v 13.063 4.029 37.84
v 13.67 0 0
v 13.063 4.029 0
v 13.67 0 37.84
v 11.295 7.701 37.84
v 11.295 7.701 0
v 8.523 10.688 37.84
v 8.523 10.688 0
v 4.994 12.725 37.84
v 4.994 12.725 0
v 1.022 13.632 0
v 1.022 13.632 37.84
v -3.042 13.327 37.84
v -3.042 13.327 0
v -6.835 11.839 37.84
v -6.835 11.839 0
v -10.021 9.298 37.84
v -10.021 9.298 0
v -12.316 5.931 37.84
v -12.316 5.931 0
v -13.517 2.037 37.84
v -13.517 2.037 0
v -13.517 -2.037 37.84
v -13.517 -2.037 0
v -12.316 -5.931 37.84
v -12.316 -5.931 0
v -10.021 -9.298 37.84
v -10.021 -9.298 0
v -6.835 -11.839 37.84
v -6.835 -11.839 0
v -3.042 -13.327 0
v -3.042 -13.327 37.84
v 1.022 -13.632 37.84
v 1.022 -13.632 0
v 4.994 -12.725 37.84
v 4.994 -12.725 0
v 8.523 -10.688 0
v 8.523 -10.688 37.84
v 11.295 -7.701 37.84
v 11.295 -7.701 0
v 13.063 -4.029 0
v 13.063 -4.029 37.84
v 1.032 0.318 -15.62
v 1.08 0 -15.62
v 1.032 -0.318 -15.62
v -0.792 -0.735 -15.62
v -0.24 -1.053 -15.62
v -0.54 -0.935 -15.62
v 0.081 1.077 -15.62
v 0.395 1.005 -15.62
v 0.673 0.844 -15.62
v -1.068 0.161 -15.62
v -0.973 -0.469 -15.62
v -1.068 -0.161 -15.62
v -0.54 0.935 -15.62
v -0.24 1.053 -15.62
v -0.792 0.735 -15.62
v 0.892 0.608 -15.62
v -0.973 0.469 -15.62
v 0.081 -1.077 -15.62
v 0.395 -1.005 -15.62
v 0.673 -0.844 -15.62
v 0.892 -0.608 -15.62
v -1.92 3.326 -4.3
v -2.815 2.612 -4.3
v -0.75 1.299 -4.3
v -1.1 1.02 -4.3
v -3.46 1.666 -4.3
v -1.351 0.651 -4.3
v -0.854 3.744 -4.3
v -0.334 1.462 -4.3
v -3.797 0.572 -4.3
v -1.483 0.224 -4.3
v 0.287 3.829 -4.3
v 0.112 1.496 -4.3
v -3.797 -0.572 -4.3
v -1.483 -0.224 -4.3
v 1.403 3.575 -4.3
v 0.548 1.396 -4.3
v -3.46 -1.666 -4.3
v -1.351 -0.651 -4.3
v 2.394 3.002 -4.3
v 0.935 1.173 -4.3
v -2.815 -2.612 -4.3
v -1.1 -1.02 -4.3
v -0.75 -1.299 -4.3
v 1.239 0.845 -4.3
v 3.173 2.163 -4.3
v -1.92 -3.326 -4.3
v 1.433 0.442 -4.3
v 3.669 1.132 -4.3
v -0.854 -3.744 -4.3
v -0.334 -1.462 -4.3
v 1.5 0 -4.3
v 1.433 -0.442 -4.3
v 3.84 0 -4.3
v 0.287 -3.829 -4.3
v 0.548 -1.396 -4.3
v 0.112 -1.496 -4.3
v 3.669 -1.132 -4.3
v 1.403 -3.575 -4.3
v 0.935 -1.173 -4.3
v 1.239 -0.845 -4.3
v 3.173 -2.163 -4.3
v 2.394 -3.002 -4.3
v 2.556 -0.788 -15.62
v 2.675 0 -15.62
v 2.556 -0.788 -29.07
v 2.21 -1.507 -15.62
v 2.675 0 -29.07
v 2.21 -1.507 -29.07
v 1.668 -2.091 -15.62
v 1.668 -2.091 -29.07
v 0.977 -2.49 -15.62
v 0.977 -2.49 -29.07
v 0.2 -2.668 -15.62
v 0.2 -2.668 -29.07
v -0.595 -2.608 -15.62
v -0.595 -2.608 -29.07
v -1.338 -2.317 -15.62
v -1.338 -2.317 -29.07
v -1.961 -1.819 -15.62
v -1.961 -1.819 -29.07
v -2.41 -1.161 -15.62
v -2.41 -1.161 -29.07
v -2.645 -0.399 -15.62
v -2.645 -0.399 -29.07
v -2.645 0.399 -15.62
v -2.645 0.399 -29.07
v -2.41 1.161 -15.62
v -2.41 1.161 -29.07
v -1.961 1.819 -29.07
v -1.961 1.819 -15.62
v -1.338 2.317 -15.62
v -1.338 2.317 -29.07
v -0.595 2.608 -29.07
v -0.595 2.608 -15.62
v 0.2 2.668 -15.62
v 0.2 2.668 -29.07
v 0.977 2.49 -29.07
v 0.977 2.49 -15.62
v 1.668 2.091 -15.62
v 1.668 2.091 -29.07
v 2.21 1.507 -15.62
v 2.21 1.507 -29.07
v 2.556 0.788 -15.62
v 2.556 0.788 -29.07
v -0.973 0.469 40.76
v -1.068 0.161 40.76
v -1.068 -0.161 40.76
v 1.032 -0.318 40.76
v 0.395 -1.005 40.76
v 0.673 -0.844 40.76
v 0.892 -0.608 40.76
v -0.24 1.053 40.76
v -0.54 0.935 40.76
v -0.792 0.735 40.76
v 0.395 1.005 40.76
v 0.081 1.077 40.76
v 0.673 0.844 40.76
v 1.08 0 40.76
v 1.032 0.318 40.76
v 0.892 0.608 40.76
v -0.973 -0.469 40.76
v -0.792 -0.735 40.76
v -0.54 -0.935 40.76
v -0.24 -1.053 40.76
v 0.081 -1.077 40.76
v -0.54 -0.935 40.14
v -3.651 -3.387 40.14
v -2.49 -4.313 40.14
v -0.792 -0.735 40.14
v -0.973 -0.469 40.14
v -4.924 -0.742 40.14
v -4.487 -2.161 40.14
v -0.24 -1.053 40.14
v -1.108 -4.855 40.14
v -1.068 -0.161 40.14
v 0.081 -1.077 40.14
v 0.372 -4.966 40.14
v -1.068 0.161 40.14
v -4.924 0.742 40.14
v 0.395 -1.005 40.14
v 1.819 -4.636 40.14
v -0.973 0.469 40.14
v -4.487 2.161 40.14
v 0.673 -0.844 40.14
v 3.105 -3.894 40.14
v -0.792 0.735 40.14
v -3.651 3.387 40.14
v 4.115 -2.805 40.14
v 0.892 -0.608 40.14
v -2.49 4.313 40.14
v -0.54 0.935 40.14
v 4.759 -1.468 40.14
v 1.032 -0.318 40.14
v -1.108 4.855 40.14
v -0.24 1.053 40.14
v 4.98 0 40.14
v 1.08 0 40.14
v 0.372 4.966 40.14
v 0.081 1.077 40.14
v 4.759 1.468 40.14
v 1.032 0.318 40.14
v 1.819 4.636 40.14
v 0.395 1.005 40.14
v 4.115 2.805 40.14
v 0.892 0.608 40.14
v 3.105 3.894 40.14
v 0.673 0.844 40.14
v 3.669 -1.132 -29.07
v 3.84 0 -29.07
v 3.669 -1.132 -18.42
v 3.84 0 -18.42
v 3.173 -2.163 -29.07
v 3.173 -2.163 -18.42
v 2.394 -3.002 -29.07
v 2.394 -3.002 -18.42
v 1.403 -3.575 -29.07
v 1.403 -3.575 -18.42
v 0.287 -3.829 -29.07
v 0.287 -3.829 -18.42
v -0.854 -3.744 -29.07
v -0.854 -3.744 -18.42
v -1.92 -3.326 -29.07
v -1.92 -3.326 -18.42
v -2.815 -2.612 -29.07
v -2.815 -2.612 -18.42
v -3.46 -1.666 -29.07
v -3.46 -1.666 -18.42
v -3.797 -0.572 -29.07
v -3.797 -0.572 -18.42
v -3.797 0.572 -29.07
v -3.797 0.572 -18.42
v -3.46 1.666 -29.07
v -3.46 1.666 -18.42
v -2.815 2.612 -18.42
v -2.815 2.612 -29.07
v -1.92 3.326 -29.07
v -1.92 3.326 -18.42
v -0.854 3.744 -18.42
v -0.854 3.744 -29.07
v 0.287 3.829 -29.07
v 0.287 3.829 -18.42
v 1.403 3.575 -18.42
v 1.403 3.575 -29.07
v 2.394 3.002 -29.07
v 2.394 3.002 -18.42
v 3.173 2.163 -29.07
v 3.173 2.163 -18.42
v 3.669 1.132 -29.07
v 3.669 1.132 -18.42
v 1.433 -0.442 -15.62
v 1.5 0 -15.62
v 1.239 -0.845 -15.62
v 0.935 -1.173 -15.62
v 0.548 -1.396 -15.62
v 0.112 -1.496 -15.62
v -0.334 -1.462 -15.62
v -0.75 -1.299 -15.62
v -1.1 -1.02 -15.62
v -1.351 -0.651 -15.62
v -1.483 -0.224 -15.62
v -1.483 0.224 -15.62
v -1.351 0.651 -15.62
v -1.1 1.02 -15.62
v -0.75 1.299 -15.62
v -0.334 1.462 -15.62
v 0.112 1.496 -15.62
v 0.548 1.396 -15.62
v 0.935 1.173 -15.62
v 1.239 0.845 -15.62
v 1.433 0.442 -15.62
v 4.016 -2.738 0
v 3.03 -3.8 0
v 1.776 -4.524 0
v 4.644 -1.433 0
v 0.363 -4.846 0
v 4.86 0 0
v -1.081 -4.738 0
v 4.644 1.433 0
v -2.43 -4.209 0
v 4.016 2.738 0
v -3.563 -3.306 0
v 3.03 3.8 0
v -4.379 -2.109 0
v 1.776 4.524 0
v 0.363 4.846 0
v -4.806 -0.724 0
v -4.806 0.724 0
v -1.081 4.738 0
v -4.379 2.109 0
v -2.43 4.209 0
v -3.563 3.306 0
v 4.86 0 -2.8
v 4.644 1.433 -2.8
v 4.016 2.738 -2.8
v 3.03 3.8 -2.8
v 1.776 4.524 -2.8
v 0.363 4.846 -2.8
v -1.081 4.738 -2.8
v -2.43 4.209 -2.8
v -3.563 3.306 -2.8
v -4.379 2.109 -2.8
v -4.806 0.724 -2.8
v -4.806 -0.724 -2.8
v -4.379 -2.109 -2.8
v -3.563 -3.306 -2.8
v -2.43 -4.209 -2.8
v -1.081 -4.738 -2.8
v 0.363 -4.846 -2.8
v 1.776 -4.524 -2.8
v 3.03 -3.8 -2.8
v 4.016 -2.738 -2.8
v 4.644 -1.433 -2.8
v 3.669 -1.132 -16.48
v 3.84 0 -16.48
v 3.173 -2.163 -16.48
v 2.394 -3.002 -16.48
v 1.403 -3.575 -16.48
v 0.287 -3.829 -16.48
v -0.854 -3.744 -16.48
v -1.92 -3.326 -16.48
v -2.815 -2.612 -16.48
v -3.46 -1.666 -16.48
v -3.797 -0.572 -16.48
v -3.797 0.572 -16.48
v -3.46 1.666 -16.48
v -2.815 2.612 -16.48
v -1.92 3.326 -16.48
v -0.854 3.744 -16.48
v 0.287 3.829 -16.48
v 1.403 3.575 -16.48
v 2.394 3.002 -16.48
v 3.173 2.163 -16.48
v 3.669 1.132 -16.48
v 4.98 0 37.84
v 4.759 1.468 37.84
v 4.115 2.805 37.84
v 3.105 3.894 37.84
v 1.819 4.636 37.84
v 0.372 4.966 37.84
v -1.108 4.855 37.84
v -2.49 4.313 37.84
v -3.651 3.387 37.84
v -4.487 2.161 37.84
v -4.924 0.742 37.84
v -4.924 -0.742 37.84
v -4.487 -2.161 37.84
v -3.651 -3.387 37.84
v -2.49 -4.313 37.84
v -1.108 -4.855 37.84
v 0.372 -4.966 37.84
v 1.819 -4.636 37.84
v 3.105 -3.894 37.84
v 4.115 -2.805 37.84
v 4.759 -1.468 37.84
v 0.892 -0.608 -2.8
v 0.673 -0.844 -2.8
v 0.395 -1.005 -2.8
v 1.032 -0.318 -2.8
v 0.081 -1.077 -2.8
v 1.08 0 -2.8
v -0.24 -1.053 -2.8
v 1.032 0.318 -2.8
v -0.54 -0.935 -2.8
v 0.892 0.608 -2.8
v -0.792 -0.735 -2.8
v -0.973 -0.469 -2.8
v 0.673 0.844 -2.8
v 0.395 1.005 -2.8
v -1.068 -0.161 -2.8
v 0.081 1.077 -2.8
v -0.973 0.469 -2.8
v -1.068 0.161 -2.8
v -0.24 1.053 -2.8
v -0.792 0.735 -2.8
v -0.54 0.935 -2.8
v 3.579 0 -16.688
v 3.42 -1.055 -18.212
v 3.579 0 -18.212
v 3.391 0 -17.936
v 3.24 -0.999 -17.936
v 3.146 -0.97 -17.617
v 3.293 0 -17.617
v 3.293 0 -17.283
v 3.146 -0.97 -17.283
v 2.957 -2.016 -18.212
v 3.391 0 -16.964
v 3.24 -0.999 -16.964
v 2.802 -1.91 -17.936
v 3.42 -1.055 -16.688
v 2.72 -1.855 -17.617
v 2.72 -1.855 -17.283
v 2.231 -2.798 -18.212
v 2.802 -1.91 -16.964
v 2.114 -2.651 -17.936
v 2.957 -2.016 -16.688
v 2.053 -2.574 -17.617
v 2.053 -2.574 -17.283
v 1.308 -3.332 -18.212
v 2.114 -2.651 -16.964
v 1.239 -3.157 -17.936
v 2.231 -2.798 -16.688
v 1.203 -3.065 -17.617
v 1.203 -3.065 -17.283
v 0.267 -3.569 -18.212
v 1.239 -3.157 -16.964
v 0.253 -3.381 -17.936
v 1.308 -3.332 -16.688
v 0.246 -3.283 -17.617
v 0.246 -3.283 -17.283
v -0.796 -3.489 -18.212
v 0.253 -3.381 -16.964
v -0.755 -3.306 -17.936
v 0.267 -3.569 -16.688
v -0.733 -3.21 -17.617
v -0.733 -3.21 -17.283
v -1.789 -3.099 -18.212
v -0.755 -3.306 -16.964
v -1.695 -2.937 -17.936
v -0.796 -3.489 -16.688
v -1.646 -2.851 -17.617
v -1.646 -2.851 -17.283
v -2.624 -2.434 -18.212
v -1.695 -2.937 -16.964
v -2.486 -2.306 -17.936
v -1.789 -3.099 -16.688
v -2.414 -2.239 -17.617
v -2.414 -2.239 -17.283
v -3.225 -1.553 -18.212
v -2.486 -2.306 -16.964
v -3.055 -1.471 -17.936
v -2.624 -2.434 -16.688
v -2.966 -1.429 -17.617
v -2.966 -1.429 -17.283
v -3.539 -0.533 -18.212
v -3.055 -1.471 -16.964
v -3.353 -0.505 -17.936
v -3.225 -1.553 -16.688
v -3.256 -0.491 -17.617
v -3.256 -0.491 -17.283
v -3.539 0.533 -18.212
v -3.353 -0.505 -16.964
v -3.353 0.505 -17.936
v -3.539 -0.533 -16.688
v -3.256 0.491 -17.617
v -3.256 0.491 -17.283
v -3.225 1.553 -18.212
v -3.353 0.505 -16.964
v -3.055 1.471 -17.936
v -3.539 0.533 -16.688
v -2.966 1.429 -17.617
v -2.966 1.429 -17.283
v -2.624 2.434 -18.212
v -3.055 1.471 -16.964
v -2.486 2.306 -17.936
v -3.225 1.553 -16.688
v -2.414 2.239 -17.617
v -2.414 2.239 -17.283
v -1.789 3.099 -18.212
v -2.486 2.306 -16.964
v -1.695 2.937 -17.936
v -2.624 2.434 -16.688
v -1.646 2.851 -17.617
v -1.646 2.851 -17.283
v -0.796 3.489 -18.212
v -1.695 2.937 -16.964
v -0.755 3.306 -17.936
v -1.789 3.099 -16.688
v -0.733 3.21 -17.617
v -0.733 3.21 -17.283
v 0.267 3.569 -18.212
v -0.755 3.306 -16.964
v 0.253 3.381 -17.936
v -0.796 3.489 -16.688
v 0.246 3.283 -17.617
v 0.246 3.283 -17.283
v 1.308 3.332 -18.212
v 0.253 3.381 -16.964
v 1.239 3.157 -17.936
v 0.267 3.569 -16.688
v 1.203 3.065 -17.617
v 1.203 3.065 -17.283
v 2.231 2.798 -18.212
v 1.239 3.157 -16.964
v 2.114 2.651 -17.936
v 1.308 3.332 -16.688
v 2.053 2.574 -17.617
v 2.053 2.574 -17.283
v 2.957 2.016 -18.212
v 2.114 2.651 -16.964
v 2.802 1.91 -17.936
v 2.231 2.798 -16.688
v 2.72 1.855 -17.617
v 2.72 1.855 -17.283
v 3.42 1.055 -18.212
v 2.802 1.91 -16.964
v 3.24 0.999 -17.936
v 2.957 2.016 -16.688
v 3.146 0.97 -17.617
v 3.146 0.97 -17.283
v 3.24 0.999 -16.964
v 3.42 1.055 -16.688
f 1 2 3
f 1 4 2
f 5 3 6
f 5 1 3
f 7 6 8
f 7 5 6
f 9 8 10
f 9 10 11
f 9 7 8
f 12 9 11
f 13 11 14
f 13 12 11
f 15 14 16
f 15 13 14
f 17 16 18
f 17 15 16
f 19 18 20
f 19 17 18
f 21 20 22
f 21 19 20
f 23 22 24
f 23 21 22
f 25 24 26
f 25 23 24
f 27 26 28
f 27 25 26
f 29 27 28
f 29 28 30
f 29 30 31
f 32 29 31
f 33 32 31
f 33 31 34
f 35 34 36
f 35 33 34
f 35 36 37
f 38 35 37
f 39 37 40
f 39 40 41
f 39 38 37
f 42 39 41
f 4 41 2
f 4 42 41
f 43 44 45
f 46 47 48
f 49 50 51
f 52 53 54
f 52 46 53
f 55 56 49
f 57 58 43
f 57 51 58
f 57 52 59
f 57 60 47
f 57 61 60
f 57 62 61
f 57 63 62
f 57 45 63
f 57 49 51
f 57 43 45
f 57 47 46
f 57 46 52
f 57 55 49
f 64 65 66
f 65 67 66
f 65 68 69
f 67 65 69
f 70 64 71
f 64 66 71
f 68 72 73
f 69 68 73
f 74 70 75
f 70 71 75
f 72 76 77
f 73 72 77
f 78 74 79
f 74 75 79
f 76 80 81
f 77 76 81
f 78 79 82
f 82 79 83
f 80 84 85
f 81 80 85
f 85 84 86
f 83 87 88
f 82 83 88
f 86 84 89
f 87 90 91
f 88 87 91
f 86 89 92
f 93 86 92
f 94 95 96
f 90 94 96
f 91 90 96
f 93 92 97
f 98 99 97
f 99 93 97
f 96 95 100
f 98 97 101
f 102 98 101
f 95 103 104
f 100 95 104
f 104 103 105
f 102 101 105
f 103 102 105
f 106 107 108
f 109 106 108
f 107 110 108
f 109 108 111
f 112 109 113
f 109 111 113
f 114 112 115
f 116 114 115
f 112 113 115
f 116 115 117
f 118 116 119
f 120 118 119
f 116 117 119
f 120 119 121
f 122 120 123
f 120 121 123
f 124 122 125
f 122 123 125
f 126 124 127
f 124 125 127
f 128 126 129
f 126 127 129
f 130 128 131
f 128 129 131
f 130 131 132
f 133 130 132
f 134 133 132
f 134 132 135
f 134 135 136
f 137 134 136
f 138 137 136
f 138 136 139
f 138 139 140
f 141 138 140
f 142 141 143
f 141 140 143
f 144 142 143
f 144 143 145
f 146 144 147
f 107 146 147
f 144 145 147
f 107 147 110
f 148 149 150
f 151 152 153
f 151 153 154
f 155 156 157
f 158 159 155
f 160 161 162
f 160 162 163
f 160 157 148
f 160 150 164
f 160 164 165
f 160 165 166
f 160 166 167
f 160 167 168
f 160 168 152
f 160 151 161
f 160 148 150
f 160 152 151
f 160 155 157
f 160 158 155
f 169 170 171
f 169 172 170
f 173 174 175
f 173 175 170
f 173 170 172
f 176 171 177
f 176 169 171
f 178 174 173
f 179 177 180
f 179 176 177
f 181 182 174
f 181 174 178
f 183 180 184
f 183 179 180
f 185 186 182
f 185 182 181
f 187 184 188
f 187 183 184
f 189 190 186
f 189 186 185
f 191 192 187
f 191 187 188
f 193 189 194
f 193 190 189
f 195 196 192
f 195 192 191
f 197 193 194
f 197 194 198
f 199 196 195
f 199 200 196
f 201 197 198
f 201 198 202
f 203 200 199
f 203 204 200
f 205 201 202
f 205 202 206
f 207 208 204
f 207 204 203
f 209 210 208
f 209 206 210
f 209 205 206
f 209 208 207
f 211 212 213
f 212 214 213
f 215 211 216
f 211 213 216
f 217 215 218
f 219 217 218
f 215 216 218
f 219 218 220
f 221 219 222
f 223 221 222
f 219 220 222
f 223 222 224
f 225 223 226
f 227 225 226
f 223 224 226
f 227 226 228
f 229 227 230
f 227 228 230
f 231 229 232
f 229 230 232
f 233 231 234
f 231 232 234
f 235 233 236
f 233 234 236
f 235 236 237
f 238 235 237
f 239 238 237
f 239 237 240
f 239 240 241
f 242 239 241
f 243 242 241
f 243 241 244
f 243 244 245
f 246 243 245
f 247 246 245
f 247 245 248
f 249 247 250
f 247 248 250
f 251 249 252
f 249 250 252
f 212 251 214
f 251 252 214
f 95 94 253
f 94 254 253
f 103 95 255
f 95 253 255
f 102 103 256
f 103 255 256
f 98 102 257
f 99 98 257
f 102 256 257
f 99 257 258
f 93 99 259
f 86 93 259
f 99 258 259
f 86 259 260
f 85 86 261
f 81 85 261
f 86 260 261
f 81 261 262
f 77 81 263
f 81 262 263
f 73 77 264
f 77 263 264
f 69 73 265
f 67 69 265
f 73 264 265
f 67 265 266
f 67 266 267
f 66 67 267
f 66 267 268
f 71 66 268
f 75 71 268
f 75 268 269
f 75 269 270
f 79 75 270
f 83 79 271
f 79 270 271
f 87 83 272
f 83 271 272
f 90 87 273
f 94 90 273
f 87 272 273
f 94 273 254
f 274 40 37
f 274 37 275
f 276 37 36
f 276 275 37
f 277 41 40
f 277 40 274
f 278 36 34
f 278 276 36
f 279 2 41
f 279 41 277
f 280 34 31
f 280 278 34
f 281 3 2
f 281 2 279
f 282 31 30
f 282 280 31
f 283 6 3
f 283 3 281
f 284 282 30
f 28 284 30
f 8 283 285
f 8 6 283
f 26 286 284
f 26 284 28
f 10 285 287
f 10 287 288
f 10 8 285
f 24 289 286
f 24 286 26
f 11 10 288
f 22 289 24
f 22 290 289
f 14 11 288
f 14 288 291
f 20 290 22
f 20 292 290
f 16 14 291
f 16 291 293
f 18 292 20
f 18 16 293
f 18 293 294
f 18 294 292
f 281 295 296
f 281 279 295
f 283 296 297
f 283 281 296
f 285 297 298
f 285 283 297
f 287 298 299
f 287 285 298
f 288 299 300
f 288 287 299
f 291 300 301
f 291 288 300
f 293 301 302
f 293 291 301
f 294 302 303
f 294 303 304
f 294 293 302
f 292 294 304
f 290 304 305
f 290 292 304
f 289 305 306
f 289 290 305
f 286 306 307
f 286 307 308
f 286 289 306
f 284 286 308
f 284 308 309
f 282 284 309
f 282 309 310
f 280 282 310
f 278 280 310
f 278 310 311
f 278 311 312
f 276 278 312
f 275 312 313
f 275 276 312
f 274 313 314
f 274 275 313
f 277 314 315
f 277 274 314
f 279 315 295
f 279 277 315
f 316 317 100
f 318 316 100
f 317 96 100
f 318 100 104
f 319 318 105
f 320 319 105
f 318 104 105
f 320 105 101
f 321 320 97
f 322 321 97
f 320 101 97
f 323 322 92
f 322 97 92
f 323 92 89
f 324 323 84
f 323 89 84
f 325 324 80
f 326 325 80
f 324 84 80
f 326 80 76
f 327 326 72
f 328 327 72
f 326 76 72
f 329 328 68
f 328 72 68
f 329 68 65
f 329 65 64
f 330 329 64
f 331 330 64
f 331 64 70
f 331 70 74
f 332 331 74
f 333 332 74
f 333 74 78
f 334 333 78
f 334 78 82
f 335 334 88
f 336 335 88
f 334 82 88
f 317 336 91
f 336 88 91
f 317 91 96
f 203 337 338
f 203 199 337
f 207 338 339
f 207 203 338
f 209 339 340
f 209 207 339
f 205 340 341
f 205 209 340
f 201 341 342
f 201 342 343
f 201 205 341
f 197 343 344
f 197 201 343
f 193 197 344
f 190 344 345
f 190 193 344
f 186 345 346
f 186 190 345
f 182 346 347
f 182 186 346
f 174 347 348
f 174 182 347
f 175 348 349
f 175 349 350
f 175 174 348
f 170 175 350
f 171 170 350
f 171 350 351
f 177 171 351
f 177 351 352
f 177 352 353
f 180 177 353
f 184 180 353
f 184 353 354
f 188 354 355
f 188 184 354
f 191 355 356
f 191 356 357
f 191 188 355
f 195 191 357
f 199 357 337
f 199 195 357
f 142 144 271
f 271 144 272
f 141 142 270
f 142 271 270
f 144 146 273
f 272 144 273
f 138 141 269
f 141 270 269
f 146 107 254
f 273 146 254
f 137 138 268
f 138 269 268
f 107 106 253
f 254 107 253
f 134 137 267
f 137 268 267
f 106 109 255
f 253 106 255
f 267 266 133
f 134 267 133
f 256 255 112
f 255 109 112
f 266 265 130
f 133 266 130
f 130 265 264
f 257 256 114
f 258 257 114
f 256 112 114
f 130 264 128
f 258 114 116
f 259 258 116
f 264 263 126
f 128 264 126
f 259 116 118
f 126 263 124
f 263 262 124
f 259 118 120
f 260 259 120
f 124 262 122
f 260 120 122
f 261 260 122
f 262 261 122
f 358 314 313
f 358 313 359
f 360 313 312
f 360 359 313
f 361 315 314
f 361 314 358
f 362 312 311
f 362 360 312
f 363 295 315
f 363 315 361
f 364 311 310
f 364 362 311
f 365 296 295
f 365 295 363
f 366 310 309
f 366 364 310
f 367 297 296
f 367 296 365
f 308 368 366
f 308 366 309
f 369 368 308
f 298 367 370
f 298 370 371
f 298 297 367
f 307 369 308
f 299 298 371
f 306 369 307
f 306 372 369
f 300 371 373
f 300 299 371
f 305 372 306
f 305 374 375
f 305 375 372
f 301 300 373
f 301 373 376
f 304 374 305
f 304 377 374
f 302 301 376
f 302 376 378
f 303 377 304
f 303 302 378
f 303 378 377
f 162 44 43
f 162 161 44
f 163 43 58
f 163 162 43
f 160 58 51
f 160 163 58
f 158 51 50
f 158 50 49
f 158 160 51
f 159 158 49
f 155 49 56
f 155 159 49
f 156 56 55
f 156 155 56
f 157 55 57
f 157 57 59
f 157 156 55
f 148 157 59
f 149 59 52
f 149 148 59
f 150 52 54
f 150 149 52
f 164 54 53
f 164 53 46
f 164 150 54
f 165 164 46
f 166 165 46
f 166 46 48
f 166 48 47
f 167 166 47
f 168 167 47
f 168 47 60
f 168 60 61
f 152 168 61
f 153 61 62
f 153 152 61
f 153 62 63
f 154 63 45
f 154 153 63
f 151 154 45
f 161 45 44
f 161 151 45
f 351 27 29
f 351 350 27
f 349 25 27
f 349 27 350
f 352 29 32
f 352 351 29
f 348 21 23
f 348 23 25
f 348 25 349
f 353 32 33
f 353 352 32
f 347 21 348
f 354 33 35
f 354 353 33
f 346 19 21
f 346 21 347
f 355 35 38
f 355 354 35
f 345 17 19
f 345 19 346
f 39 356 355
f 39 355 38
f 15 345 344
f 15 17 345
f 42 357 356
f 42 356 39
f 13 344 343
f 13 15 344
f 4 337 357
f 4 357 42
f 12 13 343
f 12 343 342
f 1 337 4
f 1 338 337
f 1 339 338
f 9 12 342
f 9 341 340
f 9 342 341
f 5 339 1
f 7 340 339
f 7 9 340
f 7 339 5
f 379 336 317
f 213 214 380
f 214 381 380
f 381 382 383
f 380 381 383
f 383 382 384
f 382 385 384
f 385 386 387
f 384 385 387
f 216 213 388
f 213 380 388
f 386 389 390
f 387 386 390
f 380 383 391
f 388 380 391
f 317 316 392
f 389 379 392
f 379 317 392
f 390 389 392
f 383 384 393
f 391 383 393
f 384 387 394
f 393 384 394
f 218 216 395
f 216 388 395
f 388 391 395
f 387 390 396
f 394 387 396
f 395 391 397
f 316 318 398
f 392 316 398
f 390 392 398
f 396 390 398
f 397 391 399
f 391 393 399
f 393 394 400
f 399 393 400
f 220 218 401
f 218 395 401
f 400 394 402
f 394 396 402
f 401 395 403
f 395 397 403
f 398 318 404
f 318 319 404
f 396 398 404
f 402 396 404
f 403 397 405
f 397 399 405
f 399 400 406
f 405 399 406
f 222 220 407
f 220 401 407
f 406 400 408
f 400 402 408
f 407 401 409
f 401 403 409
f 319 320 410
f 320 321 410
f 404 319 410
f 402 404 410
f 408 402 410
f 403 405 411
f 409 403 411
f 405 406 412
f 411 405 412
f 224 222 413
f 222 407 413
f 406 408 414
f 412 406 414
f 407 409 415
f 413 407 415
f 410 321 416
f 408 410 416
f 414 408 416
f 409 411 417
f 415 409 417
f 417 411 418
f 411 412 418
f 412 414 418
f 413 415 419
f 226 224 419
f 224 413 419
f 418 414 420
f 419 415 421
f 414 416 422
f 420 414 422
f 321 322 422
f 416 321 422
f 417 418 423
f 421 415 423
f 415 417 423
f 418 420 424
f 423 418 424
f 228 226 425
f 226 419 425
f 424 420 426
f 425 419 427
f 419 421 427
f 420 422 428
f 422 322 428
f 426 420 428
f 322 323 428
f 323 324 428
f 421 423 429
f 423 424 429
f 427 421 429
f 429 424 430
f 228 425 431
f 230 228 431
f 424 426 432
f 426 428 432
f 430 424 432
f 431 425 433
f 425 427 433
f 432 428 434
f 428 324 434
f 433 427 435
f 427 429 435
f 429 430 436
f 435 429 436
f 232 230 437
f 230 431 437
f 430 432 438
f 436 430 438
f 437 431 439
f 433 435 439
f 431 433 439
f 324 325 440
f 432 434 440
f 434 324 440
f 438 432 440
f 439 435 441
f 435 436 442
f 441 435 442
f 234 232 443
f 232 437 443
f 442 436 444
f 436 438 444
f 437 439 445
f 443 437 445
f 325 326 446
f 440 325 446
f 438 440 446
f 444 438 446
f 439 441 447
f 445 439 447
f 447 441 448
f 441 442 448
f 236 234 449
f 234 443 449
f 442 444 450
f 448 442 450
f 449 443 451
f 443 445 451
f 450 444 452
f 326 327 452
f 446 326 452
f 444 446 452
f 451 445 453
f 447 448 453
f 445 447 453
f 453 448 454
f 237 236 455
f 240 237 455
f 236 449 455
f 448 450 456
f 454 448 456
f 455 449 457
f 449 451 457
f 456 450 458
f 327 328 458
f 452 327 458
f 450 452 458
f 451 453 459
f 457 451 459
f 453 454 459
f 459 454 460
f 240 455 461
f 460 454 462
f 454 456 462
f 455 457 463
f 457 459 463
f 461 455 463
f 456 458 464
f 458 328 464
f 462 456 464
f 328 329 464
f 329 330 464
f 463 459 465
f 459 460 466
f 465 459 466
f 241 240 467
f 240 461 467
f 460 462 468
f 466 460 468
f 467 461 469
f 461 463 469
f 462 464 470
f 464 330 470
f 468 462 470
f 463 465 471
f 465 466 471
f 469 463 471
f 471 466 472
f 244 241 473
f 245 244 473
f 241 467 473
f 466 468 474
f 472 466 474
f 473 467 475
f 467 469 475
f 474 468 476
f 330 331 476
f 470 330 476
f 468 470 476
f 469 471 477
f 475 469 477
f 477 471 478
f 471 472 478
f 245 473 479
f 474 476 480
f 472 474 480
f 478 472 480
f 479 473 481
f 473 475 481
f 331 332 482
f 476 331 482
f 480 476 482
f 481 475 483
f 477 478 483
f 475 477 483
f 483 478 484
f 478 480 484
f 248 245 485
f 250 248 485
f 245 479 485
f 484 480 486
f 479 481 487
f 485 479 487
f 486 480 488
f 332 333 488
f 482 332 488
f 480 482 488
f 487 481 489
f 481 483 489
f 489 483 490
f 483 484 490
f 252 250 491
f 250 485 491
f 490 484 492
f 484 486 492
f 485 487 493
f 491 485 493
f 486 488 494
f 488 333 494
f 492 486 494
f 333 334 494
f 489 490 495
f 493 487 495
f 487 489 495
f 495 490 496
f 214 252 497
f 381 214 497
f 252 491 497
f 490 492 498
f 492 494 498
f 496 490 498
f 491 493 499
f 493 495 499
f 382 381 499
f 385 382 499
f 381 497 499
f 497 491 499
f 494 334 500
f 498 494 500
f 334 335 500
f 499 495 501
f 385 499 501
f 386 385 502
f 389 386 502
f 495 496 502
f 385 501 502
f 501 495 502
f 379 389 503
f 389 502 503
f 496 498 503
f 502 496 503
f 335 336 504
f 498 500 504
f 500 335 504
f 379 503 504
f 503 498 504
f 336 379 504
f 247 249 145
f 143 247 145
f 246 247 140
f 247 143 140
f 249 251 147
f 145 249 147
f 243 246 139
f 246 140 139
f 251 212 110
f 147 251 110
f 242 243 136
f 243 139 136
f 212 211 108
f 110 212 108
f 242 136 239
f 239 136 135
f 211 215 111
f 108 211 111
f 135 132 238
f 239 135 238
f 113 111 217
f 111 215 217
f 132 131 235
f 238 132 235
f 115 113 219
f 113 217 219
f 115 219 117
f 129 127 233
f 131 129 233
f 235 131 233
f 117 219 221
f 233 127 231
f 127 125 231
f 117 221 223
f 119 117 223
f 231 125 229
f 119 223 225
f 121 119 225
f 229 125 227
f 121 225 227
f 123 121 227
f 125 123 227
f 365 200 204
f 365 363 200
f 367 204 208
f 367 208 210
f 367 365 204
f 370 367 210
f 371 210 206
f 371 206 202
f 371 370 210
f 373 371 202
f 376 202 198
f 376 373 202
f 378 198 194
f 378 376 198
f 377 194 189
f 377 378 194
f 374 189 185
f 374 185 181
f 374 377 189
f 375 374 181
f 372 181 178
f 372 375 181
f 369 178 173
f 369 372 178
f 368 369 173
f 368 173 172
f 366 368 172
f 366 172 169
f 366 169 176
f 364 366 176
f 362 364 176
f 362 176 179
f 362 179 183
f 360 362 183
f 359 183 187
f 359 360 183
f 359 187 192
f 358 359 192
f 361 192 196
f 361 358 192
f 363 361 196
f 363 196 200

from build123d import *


with BuildPart() as f1:
    # F0 (on Front) → F1 (revolve)
    with BuildSketch(Plane.XZ):
        Polygon((0, 40.76), (0, 0), (0, -15.62), (1.08, -15.62), (1.08, -2.8), (1.08, 40.14), (1.08, 40.76), align=None)
    revolve(axis=Axis((0, 0, 20.38), (0, 0, 1)))


with BuildPart() as f2:
    # F0 (on Front) → F2 (revolve)
    with BuildSketch(Plane.XZ):
        Polygon((4.98, 40.14), (1.08, 40.14), (1.08, -2.8), (4.86, -2.8), (4.86, 0), (13.67, 0), (13.67, 37.84), (4.98, 37.84), align=None)
    revolve(axis=Axis((0, 0, 20.38), (0, 0, 1)))


with BuildPart() as f3:
    # F0 (on Front) → F3 (revolve)
    with BuildSketch(Plane.XZ):
        with BuildLine():
            Line((3.84, -4.3), (1.5, -4.3))
            Line((1.5, -4.3), (1.5, -15.62))
            Line((1.5, -15.62), (2.675, -15.62))
            Line((2.675, -15.62), (2.675, -29.07))
            Line((2.675, -29.07), (3.84, -29.07))
            Line((3.84, -29.07), (3.84, -18.42))
            ThreePointArc((3.84, -18.42), (3.28, -17.45), (3.84, -16.48))
            Line((3.84, -16.48), (3.84, -4.3))
        make_face()
    revolve(axis=Axis((0, 0, -7.81), (0, 0, -1)))


solid = Compound([f1.part, f2.part, f3.part])
